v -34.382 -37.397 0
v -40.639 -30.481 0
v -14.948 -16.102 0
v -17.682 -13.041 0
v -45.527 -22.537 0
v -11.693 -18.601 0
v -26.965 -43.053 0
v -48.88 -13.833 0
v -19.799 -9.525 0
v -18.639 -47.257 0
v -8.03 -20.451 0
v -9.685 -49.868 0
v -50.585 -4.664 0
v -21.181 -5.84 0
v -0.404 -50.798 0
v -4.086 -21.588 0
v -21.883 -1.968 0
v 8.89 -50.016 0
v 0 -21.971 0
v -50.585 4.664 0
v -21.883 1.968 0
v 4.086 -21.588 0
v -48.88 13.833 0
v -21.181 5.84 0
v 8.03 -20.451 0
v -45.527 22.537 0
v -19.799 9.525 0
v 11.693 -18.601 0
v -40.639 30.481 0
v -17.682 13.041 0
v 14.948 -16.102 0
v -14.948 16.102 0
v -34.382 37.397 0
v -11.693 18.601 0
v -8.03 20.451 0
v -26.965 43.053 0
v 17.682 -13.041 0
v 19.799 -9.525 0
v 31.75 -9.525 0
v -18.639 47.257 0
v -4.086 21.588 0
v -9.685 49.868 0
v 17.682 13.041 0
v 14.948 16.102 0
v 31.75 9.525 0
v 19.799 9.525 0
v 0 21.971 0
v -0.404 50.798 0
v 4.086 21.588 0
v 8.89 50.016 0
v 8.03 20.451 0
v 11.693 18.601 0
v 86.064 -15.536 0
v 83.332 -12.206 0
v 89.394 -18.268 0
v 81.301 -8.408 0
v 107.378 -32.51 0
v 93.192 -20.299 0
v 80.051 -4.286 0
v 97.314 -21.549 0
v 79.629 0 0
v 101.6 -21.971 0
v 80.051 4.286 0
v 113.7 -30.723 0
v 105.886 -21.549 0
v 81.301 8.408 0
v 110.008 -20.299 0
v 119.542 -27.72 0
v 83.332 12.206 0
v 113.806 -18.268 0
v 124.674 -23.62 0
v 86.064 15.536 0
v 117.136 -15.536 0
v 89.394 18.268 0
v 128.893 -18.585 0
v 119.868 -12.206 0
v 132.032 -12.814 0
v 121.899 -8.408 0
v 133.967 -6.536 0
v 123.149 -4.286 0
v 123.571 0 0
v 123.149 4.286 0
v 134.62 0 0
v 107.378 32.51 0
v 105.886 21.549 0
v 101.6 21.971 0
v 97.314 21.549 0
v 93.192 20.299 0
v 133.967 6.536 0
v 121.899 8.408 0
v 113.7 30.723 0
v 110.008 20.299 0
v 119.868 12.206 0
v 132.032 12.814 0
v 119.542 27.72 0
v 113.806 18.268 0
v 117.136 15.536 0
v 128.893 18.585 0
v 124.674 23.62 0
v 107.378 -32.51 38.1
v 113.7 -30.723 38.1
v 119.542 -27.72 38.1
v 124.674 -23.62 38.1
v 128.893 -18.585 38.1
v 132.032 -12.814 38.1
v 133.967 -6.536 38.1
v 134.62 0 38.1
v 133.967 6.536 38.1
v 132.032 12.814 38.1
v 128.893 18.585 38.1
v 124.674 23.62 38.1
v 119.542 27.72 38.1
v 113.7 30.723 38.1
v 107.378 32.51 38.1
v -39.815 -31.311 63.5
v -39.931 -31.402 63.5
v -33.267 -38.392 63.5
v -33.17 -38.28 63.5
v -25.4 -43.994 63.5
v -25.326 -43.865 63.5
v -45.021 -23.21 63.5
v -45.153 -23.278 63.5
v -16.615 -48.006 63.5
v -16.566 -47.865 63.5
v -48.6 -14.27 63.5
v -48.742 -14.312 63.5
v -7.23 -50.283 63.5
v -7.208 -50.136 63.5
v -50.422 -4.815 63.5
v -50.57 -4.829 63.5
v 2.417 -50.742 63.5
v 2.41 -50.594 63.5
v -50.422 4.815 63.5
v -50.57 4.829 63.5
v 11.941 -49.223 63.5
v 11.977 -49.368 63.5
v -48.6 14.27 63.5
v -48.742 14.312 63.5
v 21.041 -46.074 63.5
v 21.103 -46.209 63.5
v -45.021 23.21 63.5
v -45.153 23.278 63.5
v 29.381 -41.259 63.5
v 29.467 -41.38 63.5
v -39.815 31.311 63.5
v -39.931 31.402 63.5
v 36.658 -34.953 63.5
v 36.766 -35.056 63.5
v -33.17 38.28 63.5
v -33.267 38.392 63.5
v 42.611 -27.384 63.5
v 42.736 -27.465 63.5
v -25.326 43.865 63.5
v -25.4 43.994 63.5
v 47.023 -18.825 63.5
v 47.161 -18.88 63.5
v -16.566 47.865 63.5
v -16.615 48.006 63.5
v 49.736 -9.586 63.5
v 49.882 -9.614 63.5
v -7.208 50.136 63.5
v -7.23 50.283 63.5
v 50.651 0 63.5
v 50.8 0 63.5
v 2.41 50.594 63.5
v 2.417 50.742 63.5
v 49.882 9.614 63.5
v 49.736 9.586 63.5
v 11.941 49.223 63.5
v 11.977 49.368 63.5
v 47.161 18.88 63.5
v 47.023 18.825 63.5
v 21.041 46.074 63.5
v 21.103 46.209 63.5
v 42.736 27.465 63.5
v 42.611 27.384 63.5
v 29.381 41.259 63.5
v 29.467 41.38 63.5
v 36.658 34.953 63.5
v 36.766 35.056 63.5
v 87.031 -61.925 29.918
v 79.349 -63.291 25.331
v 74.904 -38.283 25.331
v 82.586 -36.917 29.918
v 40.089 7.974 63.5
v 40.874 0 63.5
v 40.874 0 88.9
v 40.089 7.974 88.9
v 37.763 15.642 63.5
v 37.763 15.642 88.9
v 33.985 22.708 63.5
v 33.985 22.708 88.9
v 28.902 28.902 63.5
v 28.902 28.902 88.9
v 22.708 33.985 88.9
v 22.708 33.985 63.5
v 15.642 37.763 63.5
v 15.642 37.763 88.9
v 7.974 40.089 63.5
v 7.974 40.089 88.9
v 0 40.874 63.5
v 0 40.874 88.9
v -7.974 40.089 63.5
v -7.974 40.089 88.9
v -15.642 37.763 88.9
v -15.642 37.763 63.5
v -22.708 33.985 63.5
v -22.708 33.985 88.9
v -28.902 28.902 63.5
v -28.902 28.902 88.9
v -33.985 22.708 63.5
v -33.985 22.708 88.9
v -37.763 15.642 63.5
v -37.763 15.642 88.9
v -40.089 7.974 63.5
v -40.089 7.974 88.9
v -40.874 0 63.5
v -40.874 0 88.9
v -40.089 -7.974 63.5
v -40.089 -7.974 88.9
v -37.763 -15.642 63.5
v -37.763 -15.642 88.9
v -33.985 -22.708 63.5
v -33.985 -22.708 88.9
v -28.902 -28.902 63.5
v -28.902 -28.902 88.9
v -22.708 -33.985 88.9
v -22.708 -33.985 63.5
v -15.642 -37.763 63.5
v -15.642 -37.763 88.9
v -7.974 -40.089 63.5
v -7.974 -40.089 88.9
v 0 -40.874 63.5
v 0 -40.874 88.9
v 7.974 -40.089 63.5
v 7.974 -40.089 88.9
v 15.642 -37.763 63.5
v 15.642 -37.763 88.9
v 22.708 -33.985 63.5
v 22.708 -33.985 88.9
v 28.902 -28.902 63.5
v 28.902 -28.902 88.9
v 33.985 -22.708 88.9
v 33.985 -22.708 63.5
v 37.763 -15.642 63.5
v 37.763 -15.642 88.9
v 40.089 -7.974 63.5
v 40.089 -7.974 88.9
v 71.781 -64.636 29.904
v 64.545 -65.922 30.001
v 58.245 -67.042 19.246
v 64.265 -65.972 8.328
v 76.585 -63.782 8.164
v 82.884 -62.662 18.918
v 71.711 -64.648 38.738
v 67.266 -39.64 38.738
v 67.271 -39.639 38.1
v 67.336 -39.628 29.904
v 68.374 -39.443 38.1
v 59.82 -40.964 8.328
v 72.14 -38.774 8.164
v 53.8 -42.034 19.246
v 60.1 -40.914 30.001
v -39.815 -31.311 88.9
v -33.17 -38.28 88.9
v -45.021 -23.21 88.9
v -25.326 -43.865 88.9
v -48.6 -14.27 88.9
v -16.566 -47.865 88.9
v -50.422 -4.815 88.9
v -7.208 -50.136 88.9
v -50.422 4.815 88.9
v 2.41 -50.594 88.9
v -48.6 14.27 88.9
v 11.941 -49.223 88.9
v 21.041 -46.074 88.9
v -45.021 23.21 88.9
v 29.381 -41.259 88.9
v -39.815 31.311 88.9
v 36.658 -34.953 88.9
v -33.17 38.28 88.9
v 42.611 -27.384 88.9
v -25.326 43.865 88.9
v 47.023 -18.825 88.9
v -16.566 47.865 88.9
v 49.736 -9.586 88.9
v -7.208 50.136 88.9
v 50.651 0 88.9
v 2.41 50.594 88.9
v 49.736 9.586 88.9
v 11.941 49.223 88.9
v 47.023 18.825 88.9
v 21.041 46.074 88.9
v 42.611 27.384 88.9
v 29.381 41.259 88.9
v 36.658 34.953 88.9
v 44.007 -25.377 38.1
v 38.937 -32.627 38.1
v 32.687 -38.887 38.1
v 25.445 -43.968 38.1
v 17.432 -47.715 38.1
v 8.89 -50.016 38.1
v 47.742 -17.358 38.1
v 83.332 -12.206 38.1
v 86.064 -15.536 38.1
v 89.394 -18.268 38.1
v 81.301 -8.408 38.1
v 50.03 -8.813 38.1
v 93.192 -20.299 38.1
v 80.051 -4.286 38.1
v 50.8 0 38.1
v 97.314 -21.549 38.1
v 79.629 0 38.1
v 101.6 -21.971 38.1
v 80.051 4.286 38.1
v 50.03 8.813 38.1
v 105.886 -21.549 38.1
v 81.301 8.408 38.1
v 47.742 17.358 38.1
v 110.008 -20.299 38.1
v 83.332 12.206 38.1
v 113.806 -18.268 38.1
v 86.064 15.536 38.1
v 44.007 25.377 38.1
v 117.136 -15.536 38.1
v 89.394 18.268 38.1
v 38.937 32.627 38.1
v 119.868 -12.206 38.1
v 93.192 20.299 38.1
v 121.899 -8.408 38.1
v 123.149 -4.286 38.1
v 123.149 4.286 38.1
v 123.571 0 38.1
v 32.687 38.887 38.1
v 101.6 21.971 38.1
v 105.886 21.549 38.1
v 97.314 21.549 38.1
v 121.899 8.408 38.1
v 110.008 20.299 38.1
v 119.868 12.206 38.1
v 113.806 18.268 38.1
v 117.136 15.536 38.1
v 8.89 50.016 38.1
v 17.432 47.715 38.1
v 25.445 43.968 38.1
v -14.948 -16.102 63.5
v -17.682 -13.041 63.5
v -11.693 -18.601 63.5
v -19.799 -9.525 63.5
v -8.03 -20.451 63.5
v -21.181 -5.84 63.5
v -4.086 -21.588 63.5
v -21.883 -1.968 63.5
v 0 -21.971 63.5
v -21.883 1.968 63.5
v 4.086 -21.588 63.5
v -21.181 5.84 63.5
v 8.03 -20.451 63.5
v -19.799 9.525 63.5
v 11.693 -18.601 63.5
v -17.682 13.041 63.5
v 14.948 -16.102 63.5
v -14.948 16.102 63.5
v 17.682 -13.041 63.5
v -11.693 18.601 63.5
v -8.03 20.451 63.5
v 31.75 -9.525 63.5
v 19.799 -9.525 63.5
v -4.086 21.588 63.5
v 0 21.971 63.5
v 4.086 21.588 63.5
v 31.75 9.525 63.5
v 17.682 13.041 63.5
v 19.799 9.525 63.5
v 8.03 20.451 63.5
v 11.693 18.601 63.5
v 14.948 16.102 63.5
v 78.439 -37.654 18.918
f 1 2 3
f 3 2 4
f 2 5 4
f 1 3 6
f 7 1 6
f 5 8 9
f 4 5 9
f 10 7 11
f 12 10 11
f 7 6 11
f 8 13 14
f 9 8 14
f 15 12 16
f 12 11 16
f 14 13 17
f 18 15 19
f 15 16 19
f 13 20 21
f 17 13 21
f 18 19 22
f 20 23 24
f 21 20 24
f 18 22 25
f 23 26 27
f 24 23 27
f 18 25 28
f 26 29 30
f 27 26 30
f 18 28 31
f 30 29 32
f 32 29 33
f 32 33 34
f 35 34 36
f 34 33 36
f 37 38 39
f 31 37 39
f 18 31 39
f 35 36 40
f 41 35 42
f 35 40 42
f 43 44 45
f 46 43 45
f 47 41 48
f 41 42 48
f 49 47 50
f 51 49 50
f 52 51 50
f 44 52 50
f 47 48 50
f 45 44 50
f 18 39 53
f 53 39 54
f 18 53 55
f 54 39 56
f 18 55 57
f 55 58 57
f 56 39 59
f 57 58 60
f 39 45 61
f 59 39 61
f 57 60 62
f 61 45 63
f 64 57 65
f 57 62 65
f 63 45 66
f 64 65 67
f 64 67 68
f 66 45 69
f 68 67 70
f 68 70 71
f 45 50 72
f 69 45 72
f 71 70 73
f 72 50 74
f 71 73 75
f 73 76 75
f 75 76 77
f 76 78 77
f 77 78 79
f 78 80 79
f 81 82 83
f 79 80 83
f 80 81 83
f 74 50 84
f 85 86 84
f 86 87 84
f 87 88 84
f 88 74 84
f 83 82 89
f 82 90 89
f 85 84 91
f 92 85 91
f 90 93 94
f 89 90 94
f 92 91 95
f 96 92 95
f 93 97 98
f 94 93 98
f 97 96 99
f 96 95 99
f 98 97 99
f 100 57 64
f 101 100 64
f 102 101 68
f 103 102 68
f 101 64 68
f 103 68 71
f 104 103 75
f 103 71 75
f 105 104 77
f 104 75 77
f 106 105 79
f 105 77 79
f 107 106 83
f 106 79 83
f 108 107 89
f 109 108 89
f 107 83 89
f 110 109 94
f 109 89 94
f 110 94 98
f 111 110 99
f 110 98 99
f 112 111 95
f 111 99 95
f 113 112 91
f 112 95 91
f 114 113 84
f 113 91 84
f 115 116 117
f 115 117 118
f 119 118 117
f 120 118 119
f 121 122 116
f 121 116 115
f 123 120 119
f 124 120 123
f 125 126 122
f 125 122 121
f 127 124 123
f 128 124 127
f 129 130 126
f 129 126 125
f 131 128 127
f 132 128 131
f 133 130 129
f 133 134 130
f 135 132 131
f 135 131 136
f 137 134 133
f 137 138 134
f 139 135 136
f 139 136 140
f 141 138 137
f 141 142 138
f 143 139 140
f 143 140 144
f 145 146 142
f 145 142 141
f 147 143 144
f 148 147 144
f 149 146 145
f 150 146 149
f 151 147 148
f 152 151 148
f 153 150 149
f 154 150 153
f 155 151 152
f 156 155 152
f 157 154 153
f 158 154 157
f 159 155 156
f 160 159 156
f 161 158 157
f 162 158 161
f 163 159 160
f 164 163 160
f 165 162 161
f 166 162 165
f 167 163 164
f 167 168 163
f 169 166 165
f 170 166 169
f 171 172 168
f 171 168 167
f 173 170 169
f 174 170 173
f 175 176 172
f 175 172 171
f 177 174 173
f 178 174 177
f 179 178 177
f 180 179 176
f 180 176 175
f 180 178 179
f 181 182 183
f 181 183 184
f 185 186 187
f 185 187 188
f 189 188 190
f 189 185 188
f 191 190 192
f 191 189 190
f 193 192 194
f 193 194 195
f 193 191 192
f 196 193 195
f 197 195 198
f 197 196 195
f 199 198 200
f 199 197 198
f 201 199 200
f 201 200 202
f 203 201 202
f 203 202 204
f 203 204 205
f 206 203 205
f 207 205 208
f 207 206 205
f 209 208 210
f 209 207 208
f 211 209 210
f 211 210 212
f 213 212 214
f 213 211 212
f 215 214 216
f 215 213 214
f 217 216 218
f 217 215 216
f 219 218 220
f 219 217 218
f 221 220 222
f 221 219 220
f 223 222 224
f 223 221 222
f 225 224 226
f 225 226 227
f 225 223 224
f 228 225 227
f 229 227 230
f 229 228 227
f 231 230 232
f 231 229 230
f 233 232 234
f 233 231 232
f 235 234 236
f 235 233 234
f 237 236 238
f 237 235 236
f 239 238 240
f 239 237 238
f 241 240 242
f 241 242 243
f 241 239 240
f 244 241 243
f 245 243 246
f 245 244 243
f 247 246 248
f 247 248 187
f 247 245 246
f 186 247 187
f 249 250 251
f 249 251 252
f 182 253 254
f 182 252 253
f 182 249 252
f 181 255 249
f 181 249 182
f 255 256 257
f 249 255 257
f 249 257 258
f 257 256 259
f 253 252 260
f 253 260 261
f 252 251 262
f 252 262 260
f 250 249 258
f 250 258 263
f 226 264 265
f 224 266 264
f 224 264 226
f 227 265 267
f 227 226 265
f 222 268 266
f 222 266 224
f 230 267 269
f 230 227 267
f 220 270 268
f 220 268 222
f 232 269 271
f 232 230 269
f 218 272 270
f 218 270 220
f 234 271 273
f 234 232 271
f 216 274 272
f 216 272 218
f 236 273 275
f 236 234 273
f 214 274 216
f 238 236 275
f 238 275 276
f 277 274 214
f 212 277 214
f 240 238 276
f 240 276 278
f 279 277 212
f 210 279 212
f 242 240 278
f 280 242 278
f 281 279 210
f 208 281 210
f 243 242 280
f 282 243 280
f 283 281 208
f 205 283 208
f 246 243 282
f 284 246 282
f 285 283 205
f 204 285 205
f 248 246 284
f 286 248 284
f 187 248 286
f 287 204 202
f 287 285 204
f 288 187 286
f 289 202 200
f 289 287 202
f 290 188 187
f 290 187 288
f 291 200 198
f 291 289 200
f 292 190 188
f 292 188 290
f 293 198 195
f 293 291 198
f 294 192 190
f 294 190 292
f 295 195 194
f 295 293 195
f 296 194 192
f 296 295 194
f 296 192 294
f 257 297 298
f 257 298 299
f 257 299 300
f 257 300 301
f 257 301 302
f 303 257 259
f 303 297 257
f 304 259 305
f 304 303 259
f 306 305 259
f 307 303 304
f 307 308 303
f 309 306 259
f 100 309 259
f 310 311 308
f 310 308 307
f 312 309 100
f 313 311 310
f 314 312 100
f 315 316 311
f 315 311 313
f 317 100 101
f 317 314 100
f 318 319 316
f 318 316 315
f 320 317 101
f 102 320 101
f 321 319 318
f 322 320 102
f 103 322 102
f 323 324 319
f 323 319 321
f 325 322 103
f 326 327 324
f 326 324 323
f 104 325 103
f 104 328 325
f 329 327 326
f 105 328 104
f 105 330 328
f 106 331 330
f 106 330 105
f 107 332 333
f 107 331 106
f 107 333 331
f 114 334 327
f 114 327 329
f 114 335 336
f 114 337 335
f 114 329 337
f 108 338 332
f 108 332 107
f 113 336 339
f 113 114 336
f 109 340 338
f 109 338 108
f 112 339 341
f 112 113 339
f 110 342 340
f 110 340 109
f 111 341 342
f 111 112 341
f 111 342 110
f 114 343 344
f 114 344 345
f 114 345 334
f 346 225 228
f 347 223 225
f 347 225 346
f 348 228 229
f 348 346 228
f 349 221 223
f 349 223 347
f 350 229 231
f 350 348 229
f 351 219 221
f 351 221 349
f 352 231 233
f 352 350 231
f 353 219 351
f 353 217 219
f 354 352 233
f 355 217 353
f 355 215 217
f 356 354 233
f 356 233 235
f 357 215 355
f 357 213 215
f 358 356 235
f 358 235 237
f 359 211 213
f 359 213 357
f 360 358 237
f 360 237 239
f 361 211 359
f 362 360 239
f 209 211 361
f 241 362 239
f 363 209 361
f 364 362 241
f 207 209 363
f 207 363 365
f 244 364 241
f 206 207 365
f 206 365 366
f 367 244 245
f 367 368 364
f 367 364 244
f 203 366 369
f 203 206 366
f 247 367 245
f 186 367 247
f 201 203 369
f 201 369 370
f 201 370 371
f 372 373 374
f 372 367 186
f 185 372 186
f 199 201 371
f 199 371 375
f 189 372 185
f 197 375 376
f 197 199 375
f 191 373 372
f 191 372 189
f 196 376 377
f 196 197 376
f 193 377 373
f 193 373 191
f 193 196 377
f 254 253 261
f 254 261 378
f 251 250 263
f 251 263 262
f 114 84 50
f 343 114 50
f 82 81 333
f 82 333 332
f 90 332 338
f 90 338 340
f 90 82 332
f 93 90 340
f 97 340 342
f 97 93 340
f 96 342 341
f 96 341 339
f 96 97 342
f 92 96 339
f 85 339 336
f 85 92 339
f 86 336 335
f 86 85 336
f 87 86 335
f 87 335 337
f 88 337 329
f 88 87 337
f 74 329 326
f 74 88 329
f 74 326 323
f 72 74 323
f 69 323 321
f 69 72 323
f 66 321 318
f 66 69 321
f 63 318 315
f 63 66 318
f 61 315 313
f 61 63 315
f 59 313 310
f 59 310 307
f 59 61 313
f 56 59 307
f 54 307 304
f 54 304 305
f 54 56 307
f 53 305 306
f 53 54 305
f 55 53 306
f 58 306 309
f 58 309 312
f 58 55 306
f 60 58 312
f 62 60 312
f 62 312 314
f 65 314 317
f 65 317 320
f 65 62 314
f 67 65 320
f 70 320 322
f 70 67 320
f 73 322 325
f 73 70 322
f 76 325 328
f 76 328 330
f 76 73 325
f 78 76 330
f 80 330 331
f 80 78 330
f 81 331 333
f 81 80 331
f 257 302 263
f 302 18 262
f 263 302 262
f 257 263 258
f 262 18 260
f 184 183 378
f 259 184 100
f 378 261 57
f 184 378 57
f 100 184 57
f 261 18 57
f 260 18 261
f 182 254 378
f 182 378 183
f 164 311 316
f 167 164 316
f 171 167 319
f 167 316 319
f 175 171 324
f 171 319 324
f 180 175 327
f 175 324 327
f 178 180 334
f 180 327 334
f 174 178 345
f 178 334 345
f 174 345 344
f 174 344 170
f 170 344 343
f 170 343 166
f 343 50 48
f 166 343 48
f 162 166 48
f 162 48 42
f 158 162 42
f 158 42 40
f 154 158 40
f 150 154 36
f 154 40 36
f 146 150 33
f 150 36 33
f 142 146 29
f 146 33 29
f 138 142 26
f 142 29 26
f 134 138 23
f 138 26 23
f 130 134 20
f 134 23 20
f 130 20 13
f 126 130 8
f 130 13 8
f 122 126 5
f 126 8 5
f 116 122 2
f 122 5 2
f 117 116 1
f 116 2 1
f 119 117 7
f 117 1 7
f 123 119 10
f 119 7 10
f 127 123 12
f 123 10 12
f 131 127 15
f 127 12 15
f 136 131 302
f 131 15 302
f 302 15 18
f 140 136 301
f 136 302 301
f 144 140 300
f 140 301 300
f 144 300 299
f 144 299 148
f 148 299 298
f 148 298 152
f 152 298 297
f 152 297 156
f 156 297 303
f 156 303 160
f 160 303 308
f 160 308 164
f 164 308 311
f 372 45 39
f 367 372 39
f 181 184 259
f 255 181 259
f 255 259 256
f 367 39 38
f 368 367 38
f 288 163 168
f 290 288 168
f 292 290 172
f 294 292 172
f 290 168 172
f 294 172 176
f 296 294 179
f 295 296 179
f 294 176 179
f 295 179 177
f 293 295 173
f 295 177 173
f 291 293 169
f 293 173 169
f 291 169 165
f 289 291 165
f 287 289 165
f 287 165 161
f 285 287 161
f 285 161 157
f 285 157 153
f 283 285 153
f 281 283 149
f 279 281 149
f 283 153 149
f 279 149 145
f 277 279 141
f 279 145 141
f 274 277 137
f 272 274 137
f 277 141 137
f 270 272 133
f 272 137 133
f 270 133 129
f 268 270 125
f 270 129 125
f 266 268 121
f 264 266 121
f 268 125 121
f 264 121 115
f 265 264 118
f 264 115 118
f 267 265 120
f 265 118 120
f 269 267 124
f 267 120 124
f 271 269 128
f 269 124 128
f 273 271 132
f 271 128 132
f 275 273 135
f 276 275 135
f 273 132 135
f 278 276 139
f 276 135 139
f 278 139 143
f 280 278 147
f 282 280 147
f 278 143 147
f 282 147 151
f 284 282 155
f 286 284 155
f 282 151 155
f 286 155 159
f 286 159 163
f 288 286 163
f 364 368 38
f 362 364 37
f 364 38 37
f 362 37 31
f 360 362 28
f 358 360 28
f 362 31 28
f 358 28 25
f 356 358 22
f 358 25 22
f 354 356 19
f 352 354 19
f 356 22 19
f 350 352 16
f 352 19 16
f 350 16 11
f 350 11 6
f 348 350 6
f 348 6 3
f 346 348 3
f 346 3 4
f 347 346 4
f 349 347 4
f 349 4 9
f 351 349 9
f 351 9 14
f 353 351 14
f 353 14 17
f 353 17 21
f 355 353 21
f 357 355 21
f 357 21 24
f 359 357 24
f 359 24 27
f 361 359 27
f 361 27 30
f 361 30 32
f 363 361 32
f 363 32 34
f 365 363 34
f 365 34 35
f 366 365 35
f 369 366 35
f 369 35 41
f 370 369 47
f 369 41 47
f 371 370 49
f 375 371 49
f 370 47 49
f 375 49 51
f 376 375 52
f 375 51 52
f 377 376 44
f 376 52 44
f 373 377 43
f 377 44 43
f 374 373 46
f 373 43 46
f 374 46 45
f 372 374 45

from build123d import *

# Parameters (mm, degrees)
F0_R     = 21.971
F1_DEPTH = 38.1
F2_DEPTH = 63.5
F5_DEPTH = 25.4
F6_R     = 50.6512427991
F6_R_2   = 40.8739745441
F7_DEPTH = 25.4


with BuildPart() as f1:
    # F0 (on Top) → F1 (new body)
    with BuildSketch(Plane.XY):
        with BuildLine():
            ThreePointArc((8.89, -50.0160764155), (38.9374626806, -32.6268907498), (50.8, 0))
            ThreePointArc((50.8, 0), (38.9374626806, 32.6268907498), (8.89, 50.0160764155))
            ThreePointArc((8.89, 50.0160764155), (-50.8, 0), (8.89, -50.0160764155))
        make_face()
        with BuildLine():
            ThreePointArc((-19.7989700742, 9.525), (0, 21.971), (19.7989700742, 9.525))
            Line((19.7989700742, 9.525), (31.75, 9.525))
            Line((31.75, 9.525), (31.75, -9.525))
            Line((31.75, -9.525), (19.7989700742, -9.525))
            ThreePointArc((19.7989700742, -9.525), (0, -21.971), (-19.7989700742, -9.525))
            Line((-19.7989700742, -9.525), (-31.75, -9.525))
            Line((-31.75, -9.525), (-31.75, 9.525))
            Line((-31.75, 9.525), (-19.7989700742, 9.525))
        make_face(mode=Mode.SUBTRACT)
        with BuildLine():
            ThreePointArc((8.89, 50.0160764155), (38.9374626806, 32.6268907498), (50.8, 0))
            ThreePointArc((50.8, 0), (38.9374626806, -32.6268907498), (8.89, -50.0160764155))
            Line((8.89, -50.0160764155), (107.3785, -32.5104496701))
            ThreePointArc((107.3785, -32.5104496701), (68.58, 0), (107.3785, 32.5104496701))
            Line((107.3785, 32.5104496701), (8.89, 50.0160764155))
        make_face()
        with BuildLine():
            ThreePointArc((134.62, 0), (126.9093507424, 21.2074789874), (107.3785, 32.5104496701))
            ThreePointArc((107.3785, 32.5104496701), (68.58, 0), (107.3785, -32.5104496701))
            ThreePointArc((107.3785, -32.5104496701), (126.9093507424, -21.2074789874), (134.62, 0))
        make_face()
        with Locations((101.6, 0)):
            Circle(F0_R, mode=Mode.SUBTRACT)
        with BuildLine():
            ThreePointArc((-19.7989700742, -9.525), (-21.971, 0), (-19.7989700742, 9.525))
            Line((-19.7989700742, 9.525), (-31.75, 9.525))
            Line((-31.75, 9.525), (-31.75, -9.525))
            Line((-31.75, -9.525), (-19.7989700742, -9.525))
        make_face()
    extrude(amount=F1_DEPTH)

    # F0 (on Top) → F2 (join)
    with BuildSketch(Plane.XY):
        with BuildLine():
            ThreePointArc((8.89, -50.0160764155), (38.9374626806, -32.6268907498), (50.8, 0))
            ThreePointArc((50.8, 0), (38.9374626806, 32.6268907498), (8.89, 50.0160764155))
            ThreePointArc((8.89, 50.0160764155), (-50.8, 0), (8.89, -50.0160764155))
        make_face()
        with BuildLine():
            ThreePointArc((-19.7989700742, 9.525), (0, 21.971), (19.7989700742, 9.525))
            Line((19.7989700742, 9.525), (31.75, 9.525))
            Line((31.75, 9.525), (31.75, -9.525))
            Line((31.75, -9.525), (19.7989700742, -9.525))
            ThreePointArc((19.7989700742, -9.525), (0, -21.971), (-19.7989700742, -9.525))
            Line((-19.7989700742, -9.525), (-31.75, -9.525))
            Line((-31.75, -9.525), (-31.75, 9.525))
            Line((-31.75, 9.525), (-19.7989700742, 9.525))
        make_face(mode=Mode.SUBTRACT)
        with BuildLine():
            ThreePointArc((-19.7989700742, -9.525), (-21.971, 0), (-19.7989700742, 9.525))
            Line((-19.7989700742, 9.525), (-31.75, 9.525))
            Line((-31.75, 9.525), (-31.75, -9.525))
            Line((-31.75, -9.525), (-19.7989700742, -9.525))
        make_face()
    extrude(amount=F2_DEPTH)

    # F4 (on face) → F5 (join)
    with BuildSketch(Plane(origin=(8.89, -50.0160764155, 0), x_dir=(0.9845684334, 0.175, 0), z_dir=(0.175, -0.9845684334, 0))):
        Polygon((64.2408422213, 8.1636081304), (70.6394698458, 18.9178303739), (67.0485100533, 25.3305059427), (59.4336241402, 20.8529178065), (59.3616303693, 29.9041031382), (52.0126105242, 30.0005785183), (45.6139828997, 19.2463562748), (51.7280987483, 8.3278710809), align=None)
        Polygon((59.4336241402, 20.8529178065), (67.0485100533, 25.3305059427), (64.5253539973, 29.8363155678), (59.3616303693, 29.9041031382), align=None)
        Polygon((64.5253539973, 29.8363155678), (67.0485100533, 25.3305059427), (74.8510695994, 29.9184470431), (59.2913682522, 38.7375818539), (59.3616303693, 29.9041031382), align=None)
    extrude(amount=F5_DEPTH)

    # F6 (on face) → F7 (join)
    with BuildSketch(Plane.XY.offset(63.5)):
        Circle(F6_R)
        Circle(F6_R_2, mode=Mode.SUBTRACT)
    extrude(amount=F7_DEPTH)


solid = f1.part
